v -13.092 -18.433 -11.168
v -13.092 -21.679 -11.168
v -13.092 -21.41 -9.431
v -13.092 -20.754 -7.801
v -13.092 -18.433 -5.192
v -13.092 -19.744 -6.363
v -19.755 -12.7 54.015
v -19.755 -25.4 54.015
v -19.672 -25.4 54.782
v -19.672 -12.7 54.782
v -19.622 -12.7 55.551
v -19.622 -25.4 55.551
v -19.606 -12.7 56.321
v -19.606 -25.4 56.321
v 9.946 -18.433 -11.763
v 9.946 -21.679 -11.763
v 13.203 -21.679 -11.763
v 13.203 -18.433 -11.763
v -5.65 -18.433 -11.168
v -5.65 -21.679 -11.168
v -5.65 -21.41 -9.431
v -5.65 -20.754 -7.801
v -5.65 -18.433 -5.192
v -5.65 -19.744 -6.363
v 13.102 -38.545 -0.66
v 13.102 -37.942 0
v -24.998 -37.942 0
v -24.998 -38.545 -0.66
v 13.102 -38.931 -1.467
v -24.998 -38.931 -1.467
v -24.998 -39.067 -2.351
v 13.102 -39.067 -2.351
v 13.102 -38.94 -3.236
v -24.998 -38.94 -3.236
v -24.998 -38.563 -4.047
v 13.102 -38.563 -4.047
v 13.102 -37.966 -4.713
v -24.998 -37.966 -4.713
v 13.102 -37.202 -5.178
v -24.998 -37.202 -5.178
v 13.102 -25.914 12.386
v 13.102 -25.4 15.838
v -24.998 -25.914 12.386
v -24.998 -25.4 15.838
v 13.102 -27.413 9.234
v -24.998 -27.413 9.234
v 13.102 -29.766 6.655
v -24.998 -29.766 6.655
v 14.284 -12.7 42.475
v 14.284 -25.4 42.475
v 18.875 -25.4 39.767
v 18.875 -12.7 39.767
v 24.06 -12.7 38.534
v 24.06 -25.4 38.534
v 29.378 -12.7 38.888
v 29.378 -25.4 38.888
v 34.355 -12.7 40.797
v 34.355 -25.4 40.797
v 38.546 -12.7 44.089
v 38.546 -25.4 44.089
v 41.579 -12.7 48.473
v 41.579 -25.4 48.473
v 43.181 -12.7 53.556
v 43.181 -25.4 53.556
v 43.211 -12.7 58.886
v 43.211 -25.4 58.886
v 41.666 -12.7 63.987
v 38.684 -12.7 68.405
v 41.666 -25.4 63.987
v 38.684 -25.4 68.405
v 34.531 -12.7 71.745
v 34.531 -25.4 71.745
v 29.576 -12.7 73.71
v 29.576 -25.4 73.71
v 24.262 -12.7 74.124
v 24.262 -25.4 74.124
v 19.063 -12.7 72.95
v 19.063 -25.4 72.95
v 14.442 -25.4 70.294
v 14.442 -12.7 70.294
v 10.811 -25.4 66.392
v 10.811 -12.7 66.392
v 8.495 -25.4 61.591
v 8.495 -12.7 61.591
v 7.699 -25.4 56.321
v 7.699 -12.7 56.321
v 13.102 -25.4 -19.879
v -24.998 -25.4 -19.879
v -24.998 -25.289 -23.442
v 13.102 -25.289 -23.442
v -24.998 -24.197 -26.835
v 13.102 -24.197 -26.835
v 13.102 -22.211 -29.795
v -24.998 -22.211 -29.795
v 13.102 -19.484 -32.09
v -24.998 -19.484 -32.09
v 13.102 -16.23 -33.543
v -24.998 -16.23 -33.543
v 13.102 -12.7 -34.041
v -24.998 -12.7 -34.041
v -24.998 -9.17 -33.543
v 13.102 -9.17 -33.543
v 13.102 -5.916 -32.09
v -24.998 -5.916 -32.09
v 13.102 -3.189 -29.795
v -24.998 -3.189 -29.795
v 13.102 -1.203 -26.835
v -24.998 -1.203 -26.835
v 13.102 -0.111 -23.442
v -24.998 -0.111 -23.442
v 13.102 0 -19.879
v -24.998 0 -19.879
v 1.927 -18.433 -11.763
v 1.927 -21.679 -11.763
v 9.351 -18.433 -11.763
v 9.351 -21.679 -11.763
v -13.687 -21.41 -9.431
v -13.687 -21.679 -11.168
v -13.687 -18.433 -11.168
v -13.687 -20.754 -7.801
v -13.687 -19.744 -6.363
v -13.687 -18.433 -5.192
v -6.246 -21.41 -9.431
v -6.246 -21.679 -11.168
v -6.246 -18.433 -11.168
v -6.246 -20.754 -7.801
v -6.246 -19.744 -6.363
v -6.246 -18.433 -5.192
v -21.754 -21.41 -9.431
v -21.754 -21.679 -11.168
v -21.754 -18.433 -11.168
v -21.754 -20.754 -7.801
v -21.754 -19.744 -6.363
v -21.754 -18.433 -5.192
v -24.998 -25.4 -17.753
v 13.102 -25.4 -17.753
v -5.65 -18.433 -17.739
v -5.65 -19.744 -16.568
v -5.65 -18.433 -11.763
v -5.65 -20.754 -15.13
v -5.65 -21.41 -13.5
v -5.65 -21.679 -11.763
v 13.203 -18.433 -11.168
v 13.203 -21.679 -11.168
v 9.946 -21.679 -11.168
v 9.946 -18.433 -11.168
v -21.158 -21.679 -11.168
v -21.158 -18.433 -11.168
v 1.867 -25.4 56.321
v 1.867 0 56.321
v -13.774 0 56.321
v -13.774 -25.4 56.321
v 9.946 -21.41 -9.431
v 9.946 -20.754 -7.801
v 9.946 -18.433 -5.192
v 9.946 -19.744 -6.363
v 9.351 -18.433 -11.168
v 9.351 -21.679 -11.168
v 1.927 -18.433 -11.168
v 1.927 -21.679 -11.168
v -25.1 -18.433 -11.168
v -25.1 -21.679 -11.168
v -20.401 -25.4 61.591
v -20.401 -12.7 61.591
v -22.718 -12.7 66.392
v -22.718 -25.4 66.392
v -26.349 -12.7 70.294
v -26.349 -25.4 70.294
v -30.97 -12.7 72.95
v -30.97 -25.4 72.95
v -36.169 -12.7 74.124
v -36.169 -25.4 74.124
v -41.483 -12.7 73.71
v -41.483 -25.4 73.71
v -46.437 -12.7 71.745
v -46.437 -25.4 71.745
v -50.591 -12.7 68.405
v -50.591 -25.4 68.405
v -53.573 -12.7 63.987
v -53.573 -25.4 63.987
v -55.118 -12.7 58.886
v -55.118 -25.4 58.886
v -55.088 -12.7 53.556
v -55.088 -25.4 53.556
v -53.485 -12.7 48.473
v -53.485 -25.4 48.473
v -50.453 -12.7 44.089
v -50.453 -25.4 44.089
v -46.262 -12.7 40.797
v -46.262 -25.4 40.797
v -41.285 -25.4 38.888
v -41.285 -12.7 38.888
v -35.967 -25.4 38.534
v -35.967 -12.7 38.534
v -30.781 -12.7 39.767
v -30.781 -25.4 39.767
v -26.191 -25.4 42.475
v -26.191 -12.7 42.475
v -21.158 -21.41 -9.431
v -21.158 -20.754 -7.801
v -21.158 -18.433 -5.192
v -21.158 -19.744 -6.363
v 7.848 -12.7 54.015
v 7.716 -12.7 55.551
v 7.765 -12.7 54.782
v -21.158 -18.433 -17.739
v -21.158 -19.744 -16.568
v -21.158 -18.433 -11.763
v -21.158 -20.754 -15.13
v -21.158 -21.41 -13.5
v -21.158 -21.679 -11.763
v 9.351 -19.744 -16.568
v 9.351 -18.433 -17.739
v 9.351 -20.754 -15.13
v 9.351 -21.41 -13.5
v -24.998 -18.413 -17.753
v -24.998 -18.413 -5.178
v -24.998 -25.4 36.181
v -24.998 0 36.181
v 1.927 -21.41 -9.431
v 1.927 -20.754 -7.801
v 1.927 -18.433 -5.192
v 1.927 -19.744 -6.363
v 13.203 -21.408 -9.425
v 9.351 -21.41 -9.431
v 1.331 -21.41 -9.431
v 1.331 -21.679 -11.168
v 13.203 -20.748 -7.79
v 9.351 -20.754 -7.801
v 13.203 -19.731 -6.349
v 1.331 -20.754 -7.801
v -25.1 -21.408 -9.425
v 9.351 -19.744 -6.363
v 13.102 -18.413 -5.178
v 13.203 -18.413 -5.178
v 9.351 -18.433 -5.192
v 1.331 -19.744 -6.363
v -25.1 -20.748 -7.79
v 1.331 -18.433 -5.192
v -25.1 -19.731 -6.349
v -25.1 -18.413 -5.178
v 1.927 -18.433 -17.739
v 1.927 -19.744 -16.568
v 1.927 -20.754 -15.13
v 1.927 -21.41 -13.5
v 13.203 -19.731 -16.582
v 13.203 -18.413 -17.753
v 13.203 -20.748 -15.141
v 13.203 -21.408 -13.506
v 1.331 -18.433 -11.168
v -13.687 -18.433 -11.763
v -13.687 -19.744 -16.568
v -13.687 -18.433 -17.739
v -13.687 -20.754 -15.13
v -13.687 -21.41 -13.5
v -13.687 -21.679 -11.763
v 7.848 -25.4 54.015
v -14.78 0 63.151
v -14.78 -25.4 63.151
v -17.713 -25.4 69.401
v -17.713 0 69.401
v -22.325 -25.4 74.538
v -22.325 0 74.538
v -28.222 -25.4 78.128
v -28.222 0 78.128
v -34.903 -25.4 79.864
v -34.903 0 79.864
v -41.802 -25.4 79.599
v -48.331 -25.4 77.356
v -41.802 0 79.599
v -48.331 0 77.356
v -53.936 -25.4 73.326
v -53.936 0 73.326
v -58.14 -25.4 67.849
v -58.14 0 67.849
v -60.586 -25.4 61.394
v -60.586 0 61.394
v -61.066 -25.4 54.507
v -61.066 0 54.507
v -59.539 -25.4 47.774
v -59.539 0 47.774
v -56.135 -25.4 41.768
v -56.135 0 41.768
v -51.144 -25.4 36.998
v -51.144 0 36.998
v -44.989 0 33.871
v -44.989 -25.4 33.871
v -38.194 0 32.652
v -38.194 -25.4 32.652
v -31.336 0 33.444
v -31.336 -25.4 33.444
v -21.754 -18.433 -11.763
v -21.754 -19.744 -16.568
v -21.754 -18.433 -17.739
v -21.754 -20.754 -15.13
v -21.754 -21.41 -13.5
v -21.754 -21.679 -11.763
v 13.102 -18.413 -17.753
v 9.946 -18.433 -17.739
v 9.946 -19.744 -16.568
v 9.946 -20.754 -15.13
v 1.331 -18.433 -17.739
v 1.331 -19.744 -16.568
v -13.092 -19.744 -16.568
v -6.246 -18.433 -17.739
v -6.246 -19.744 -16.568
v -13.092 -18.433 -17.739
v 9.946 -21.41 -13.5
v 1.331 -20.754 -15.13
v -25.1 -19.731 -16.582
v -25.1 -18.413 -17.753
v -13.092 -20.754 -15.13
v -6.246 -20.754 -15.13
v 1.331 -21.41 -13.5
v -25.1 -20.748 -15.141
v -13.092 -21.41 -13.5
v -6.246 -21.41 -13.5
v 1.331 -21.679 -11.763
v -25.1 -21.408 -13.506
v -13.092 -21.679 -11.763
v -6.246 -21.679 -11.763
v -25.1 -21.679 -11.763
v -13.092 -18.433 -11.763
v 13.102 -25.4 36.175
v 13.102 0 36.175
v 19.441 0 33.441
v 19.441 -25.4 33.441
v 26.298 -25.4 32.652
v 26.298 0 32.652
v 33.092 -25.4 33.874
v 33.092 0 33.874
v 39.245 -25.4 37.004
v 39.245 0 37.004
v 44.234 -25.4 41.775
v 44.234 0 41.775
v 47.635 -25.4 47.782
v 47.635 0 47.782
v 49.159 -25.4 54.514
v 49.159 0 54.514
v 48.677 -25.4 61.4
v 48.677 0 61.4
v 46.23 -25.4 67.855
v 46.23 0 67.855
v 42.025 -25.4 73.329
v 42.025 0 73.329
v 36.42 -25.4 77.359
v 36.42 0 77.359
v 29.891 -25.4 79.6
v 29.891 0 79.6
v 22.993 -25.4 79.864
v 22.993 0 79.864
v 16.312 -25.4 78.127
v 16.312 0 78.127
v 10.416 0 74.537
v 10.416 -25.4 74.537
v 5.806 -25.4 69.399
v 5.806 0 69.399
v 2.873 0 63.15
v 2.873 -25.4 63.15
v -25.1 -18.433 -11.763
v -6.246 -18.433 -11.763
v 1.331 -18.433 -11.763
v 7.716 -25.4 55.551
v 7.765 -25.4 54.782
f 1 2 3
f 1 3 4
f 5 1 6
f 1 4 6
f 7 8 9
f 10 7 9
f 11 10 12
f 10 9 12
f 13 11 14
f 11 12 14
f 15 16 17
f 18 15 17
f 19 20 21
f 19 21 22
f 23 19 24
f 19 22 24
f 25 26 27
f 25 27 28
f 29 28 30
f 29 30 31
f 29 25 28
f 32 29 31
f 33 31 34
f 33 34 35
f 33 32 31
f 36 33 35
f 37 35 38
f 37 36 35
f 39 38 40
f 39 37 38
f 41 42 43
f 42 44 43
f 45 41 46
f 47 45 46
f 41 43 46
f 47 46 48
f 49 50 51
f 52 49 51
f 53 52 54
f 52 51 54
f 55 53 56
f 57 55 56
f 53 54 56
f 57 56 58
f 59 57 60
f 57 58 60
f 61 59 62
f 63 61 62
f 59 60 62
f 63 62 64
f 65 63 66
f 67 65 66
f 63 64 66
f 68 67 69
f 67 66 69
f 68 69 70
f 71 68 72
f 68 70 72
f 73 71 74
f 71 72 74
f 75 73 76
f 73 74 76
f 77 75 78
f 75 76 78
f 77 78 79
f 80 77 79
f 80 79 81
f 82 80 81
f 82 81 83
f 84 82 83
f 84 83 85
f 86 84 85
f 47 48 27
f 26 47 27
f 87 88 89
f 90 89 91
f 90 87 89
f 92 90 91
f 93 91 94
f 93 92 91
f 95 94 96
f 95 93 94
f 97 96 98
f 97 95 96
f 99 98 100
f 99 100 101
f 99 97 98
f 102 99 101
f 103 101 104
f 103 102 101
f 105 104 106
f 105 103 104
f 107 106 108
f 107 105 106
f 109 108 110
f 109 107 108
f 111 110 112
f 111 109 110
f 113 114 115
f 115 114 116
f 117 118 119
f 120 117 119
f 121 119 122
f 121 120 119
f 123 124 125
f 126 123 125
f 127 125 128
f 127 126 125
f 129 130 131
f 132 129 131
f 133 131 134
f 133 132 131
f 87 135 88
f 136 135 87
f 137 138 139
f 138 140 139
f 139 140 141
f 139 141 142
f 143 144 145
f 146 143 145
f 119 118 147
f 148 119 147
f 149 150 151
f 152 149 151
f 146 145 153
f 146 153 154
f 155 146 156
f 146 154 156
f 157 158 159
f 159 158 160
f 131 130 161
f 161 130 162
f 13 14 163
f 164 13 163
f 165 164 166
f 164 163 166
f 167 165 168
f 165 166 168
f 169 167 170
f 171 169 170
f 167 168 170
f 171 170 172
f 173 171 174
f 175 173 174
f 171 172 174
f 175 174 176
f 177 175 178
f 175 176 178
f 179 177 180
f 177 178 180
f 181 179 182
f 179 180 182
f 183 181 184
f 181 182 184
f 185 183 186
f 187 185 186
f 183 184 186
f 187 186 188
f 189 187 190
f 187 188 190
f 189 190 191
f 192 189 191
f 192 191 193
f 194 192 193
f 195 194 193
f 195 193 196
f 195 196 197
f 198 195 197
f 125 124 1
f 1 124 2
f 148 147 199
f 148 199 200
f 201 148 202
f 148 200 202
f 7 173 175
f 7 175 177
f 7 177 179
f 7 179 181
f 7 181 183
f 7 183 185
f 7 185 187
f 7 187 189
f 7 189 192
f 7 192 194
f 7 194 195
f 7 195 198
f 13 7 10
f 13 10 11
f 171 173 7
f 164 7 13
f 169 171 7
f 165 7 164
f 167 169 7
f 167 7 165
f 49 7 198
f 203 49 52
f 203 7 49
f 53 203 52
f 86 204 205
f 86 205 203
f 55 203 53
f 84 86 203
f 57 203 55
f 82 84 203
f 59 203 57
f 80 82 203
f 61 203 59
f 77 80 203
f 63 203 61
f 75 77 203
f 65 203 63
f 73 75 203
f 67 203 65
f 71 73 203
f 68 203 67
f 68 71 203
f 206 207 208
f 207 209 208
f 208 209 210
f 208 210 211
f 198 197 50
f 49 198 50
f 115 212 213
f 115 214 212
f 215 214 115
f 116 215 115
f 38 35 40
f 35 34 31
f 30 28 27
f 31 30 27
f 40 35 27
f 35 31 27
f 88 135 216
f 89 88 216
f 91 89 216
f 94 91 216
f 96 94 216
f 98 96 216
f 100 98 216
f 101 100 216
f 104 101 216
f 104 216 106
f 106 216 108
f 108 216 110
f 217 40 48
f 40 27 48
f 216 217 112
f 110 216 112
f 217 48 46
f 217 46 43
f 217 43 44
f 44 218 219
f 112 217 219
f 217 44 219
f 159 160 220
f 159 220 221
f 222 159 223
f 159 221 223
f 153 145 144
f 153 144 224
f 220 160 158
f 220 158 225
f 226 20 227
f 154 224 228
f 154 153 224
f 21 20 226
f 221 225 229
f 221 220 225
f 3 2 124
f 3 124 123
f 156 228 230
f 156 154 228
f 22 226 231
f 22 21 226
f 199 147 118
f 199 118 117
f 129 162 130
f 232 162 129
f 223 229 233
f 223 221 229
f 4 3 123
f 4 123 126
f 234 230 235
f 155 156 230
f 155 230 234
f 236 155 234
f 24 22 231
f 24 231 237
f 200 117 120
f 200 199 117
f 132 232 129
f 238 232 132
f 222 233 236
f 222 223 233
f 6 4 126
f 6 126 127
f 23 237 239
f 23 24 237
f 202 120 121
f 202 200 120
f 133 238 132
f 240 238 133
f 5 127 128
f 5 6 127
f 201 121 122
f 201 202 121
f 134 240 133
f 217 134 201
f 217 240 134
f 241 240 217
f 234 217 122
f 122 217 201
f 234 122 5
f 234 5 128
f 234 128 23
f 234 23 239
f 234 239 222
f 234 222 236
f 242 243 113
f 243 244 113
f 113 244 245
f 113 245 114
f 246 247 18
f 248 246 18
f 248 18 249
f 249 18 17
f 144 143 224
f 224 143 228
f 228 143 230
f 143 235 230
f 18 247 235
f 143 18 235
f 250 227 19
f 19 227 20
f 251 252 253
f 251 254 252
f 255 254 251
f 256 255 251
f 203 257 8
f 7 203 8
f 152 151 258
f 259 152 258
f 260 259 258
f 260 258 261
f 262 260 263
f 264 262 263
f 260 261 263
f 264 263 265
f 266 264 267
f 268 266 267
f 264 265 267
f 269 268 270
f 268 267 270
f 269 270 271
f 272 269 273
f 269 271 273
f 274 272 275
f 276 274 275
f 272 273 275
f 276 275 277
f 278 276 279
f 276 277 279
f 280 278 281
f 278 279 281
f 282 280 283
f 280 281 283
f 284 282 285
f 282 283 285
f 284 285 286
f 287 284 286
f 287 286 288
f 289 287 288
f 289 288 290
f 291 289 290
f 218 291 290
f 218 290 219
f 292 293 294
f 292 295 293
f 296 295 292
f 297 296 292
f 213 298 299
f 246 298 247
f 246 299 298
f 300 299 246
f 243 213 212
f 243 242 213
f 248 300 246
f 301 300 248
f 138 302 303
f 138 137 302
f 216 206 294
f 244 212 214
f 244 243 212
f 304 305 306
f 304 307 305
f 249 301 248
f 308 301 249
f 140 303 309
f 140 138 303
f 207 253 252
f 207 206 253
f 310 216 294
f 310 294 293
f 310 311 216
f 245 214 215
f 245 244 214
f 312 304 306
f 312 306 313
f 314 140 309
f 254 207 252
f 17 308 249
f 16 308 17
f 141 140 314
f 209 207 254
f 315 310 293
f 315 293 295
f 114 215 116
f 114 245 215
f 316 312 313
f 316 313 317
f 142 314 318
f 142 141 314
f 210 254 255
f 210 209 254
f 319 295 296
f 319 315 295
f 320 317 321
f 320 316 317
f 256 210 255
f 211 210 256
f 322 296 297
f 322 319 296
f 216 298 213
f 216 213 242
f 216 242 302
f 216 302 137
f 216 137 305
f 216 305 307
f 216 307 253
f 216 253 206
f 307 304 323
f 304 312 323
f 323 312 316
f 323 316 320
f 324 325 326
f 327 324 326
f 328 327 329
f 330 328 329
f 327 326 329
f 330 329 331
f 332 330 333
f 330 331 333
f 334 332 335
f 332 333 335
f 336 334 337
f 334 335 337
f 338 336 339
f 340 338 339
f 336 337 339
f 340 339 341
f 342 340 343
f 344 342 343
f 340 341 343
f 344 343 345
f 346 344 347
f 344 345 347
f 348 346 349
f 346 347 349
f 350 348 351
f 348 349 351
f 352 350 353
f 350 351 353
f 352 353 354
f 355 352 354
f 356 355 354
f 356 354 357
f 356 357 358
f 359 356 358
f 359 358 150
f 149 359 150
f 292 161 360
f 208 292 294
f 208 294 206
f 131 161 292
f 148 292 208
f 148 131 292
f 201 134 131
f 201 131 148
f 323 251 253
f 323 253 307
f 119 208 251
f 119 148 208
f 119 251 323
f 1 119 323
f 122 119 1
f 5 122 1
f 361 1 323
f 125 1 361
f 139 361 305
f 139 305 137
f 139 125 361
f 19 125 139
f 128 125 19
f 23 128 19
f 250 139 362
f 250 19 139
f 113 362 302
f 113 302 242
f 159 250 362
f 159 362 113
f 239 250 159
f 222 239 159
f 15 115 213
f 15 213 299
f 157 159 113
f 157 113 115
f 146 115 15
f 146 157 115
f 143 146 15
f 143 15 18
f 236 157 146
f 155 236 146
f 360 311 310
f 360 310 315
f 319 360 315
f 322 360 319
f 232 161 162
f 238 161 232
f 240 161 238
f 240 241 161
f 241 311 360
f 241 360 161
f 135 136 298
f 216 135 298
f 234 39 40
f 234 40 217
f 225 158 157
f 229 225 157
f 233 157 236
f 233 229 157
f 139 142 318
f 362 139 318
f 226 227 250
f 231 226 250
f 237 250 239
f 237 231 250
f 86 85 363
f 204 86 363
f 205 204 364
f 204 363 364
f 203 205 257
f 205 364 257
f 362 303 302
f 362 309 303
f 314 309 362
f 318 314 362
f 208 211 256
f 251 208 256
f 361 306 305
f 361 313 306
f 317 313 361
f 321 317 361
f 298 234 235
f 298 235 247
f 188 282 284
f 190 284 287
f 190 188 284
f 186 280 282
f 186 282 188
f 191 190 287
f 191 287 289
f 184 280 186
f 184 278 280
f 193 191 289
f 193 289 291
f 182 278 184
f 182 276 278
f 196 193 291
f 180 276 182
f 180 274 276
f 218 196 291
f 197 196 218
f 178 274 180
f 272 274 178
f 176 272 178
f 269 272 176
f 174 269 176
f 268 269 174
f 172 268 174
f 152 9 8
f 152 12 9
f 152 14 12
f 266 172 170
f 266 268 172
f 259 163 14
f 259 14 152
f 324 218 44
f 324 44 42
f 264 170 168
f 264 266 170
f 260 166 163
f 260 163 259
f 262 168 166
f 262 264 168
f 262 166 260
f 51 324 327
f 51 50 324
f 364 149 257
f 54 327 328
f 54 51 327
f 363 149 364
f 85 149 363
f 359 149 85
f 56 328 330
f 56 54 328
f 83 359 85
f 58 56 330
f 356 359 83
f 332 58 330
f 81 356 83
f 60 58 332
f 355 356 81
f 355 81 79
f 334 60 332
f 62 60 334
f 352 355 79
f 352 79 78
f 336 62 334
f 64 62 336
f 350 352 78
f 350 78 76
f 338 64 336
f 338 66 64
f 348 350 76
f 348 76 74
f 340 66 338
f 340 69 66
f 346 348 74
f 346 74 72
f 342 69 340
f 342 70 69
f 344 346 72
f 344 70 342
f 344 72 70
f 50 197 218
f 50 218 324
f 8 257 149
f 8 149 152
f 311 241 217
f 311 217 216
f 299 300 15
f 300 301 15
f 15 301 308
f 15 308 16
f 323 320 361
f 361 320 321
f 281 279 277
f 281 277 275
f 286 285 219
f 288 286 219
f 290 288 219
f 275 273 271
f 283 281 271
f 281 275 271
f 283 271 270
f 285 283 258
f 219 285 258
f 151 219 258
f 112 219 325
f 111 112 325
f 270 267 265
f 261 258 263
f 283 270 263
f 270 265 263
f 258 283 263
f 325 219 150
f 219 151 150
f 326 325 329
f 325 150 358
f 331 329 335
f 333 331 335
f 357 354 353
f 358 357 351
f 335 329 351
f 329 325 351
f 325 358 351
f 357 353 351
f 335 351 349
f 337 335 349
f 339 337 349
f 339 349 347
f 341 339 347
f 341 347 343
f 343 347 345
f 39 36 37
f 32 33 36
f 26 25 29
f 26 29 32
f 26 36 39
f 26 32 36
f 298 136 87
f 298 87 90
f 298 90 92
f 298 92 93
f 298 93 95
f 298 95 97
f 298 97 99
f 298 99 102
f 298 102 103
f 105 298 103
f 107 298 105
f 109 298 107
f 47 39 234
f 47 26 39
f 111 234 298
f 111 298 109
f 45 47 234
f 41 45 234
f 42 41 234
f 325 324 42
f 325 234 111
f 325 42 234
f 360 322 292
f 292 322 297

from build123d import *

# Parameters (mm, degrees)
F1_DEPTH  = 25.4
F3_DEPTH  = 38.1
F5_DEPTH  = 38.1
F4_W      = 6.9873932093
F4_H      = 12.5755788758
F6_DEPTH  = 74.2380387742
F10_DEPTH = 19.1516
F12_DEPTH = 12.7
F14_W     = 3.3459962718
F14_H     = 0.297806253
F14_W_2   = 0.595612506
F14_W_3   = 7.4709270083
F14_H_2   = 5.9899831849
F14_W_4   = 6.8456454549
F14_W_5   = 6.9815108719
F14_W_6   = 7.4240169587
F14_W_7   = 3.2570409043
F15_DEPTH = 3.2512
F16_R     = 11.8404858978


with BuildPart() as f1:
    # F0 (on Front) → F1 (new body)
    with BuildSketch(Plane.XZ):
        with BuildLine():
            Line((1.8669807536, 56.3211729646), (-13.7737724727, 56.3211729646))
            ThreePointArc((-13.7737724727, 56.3211729646), (-58.1397054496, 67.8494936223), (-24.9982573971, 36.1811717994))
            Line((-24.9982573971, 36.1811717994), (-24.9982573971, -19.8788270354))
            Line((-24.9982573971, -19.8788270354), (13.1017426029, -19.8788270354))
            Line((13.1017426029, -19.8788270354), (13.1017426029, 36.1748193053))
            ThreePointArc((13.1017426029, 36.1748193053), (46.2299722184, 67.8547699704), (1.8669807536, 56.3211729646))
        make_face()
        with BuildLine():
            ThreePointArc((-26.1908572696, 42.4751723279), (-53.0432504616, 65.0145085437), (-19.7552210705, 54.0154269254))
            Line((-19.7552210705, 54.0154269254), (7.8484293514, 54.0154269254))
            ThreePointArc((7.8484293514, 54.0154269254), (41.1364587425, 65.0145085437), (14.2840655504, 42.4751723279))
            Line((14.2840655504, 42.4751723279), (-26.1908572696, 42.4751723279))
        make_face(mode=Mode.SUBTRACT)
        with BuildLine():
            Line((7.8484293514, 54.0154269254), (-19.7552210705, 54.0154269254))
            ThreePointArc((-19.7552210705, 54.0154269254), (-53.0432504616, 65.0145085437), (-26.1908572696, 42.4751723279))
            Line((-26.1908572696, 42.4751723279), (14.2840655504, 42.4751723279))
            ThreePointArc((14.2840655504, 42.4751723279), (41.1364587425, 65.0145085437), (7.8484293514, 54.0154269254))
        make_face()
    extrude(amount=F1_DEPTH)

    # F2 (on face) → F3 (join, through all)
    with BuildSketch(Plane.YZ.offset(13.1017426029)):
        with BuildLine():
            Line((0, -19.8788270354), (-25.4, -19.8788270354))
            ThreePointArc((-25.4, -19.8788270354), (-12.7, -34.0406843529), (0, -19.8788270354))
        make_face()
    extrude(amount=-F3_DEPTH)

    # F4 (on face) → F5 (join, through all)
    with BuildSketch(Plane.YZ.offset(13.1017426029)):
        with BuildLine():
            Line((-25.4, -5.1776664332), (-25.4, 10.2089252323))
            Line((-25.4, 10.2089252323), (-37.9417426884, 0))
            ThreePointArc((-37.9417426884, 0), (-39.036129938, -2.7980343054), (-37.202000618, -5.1776664332))
            Line((-37.202000618, -5.1776664332), (-25.4, -5.1776664332))
        make_face()
    extrude(amount=-F5_DEPTH)

    # F4 (on face) → F6 (cut, through all)
    with BuildSketch(Plane.YZ.offset(13.1017426029)):
        with Locations((-21.9063033953, -11.4654558711)):
            Rectangle(F4_W, F4_H)
    extrude(amount=-F6_DEPTH, mode=Mode.SUBTRACT)

    # F9 (on line) → F10 (join, symmetric)
    with BuildSketch(Plane(origin=(-5.9482573971, 0, 0), x_dir=(0, -1, 0), z_dir=(-1, 0, 0))):
        with BuildLine():
            ThreePointArc((18.4126067907, -17.753245309), (21.6845212051, -11.4654558711), (18.4126067907, -5.1776664332))
            Line((18.4126067907, -5.1776664332), (18.4126067907, -17.753245309))
        make_face()
    extrude(amount=F10_DEPTH, both=True)

    # F11 (on face) → F12 (cut)
    with BuildSketch(Plane.XZ.offset(25.4)):
        with BuildLine():
            Line((-26.1908572696, 42.4751723279), (-24.9982573971, 42.4751723279))
            Line((-24.9982573971, 42.4751723279), (13.1017426029, 42.4751723279))
            Line((13.1017426029, 42.4751723279), (14.2840655504, 42.4751723279))
            ThreePointArc((14.2840655504, 42.4751723279), (41.6664593623, 63.9872752599), (7.6988727683, 56.3211729646))
            ThreePointArc((7.6988727683, 56.3211729646), (7.736301157, 55.1658773348), (7.8484293514, 54.0154269254))
            Line((7.8484293514, 54.0154269254), (-19.7552210705, 54.0154269254))
            ThreePointArc((-19.7552210705, 54.0154269254), (-19.6430928761, 55.1658773348), (-19.6056644874, 56.3211729646))
            ThreePointArc((-19.6056644874, 56.3211729646), (-53.5732510815, 63.9872752599), (-26.1908572696, 42.4751723279))
        make_face()
    extrude(amount=-F12_DEPTH, mode=Mode.SUBTRACT)

    # F14 (on line) → F15 (cut)
    with BuildSketch(Plane.XZ.offset(21.6845212051)):
        with Locations((-23.4268592612, -11.3165527446)):
            Rectangle(F14_W, F14_H)
        with Locations((-23.4268592612, -11.6143589976)):
            Rectangle(F14_W, F14_H)
        with Locations((-21.4560548723, -11.3165527446)):
            Rectangle(F14_W_2, F14_H)
        with Locations((-21.4560548723, -11.6143589976)):
            Rectangle(F14_W_2, F14_H)
        with Locations((-17.4227851151, -11.3165527446)):
            Rectangle(F14_W_3, F14_H)
        with Locations((-17.4227851151, -11.6143589976)):
            Rectangle(F14_W_3, F14_H)
        with Locations((-21.4560548723, -8.1726580256)):
            Rectangle(F14_W_2, F14_H_2)
        with Locations((-21.4560548723, -14.7582537165)):
            Rectangle(F14_W_2, F14_H_2)
        with Locations((-13.389515358, -11.3165527446)):
            Rectangle(F14_W_2, F14_H)
        with Locations((-13.389515358, -11.6143589976)):
            Rectangle(F14_W_2, F14_H)
        with Locations((-9.6688863776, -11.3165527446)):
            Rectangle(F14_W_4, F14_H)
        with Locations((-9.6688863776, -11.6143589976)):
            Rectangle(F14_W_4, F14_H)
        with Locations((-13.389515358, -8.1726580256)):
            Rectangle(F14_W_2, F14_H_2)
        with Locations((-13.389515358, -14.7582537165)):
            Rectangle(F14_W_2, F14_H_2)
        with Locations((-5.9482573971, -11.3165527446)):
            Rectangle(F14_W_2, F14_H)
        with Locations((-5.9482573971, -11.6143589976)):
            Rectangle(F14_W_2, F14_H)
        with Locations((-2.1596957082, -11.3165527446)):
            Rectangle(F14_W_5, F14_H)
        with Locations((-2.1596957082, -11.6143589976)):
            Rectangle(F14_W_5, F14_H)
        with Locations((-5.9482573971, -8.1726580256)):
            Rectangle(F14_W_2, F14_H_2)
        with Locations((-5.9482573971, -14.7582537165)):
            Rectangle(F14_W_2, F14_H_2)
        with Locations((1.6288659808, -11.3165527446)):
            Rectangle(F14_W_2, F14_H)
        with Locations((1.6288659808, -11.6143589976)):
            Rectangle(F14_W_2, F14_H)
        with Locations((5.6386807132, -11.3165527446)):
            Rectangle(F14_W_6, F14_H)
        with Locations((5.6386807132, -11.6143589976)):
            Rectangle(F14_W_6, F14_H)
        with Locations((1.6288659808, -8.1726580256)):
            Rectangle(F14_W_2, F14_H_2)
        with Locations((1.6288659808, -14.7582537165)):
            Rectangle(F14_W_2, F14_H_2)
        with Locations((9.6484954455, -11.3165527446)):
            Rectangle(F14_W_2, F14_H)
        with Locations((9.6484954455, -11.6143589976)):
            Rectangle(F14_W_2, F14_H)
        with Locations((11.5748221507, -11.3165527446)):
            Rectangle(F14_W_7, F14_H)
        with Locations((11.5748221507, -11.6143589976)):
            Rectangle(F14_W_7, F14_H)
        with Locations((9.6484954455, -8.1726580256)):
            Rectangle(F14_W_2, F14_H_2)
        with Locations((9.6484954455, -14.7582537165)):
            Rectangle(F14_W_2, F14_H_2)
    extrude(amount=-F15_DEPTH, mode=Mode.SUBTRACT)

    # F16
    f16_edges = [f1.edges().sort_by_distance(p)[0] for p in [
        (-5.948257, -25.4, 10.208925),
    ]]
    fillet(f16_edges, radius=F16_R)


solid = f1.part
